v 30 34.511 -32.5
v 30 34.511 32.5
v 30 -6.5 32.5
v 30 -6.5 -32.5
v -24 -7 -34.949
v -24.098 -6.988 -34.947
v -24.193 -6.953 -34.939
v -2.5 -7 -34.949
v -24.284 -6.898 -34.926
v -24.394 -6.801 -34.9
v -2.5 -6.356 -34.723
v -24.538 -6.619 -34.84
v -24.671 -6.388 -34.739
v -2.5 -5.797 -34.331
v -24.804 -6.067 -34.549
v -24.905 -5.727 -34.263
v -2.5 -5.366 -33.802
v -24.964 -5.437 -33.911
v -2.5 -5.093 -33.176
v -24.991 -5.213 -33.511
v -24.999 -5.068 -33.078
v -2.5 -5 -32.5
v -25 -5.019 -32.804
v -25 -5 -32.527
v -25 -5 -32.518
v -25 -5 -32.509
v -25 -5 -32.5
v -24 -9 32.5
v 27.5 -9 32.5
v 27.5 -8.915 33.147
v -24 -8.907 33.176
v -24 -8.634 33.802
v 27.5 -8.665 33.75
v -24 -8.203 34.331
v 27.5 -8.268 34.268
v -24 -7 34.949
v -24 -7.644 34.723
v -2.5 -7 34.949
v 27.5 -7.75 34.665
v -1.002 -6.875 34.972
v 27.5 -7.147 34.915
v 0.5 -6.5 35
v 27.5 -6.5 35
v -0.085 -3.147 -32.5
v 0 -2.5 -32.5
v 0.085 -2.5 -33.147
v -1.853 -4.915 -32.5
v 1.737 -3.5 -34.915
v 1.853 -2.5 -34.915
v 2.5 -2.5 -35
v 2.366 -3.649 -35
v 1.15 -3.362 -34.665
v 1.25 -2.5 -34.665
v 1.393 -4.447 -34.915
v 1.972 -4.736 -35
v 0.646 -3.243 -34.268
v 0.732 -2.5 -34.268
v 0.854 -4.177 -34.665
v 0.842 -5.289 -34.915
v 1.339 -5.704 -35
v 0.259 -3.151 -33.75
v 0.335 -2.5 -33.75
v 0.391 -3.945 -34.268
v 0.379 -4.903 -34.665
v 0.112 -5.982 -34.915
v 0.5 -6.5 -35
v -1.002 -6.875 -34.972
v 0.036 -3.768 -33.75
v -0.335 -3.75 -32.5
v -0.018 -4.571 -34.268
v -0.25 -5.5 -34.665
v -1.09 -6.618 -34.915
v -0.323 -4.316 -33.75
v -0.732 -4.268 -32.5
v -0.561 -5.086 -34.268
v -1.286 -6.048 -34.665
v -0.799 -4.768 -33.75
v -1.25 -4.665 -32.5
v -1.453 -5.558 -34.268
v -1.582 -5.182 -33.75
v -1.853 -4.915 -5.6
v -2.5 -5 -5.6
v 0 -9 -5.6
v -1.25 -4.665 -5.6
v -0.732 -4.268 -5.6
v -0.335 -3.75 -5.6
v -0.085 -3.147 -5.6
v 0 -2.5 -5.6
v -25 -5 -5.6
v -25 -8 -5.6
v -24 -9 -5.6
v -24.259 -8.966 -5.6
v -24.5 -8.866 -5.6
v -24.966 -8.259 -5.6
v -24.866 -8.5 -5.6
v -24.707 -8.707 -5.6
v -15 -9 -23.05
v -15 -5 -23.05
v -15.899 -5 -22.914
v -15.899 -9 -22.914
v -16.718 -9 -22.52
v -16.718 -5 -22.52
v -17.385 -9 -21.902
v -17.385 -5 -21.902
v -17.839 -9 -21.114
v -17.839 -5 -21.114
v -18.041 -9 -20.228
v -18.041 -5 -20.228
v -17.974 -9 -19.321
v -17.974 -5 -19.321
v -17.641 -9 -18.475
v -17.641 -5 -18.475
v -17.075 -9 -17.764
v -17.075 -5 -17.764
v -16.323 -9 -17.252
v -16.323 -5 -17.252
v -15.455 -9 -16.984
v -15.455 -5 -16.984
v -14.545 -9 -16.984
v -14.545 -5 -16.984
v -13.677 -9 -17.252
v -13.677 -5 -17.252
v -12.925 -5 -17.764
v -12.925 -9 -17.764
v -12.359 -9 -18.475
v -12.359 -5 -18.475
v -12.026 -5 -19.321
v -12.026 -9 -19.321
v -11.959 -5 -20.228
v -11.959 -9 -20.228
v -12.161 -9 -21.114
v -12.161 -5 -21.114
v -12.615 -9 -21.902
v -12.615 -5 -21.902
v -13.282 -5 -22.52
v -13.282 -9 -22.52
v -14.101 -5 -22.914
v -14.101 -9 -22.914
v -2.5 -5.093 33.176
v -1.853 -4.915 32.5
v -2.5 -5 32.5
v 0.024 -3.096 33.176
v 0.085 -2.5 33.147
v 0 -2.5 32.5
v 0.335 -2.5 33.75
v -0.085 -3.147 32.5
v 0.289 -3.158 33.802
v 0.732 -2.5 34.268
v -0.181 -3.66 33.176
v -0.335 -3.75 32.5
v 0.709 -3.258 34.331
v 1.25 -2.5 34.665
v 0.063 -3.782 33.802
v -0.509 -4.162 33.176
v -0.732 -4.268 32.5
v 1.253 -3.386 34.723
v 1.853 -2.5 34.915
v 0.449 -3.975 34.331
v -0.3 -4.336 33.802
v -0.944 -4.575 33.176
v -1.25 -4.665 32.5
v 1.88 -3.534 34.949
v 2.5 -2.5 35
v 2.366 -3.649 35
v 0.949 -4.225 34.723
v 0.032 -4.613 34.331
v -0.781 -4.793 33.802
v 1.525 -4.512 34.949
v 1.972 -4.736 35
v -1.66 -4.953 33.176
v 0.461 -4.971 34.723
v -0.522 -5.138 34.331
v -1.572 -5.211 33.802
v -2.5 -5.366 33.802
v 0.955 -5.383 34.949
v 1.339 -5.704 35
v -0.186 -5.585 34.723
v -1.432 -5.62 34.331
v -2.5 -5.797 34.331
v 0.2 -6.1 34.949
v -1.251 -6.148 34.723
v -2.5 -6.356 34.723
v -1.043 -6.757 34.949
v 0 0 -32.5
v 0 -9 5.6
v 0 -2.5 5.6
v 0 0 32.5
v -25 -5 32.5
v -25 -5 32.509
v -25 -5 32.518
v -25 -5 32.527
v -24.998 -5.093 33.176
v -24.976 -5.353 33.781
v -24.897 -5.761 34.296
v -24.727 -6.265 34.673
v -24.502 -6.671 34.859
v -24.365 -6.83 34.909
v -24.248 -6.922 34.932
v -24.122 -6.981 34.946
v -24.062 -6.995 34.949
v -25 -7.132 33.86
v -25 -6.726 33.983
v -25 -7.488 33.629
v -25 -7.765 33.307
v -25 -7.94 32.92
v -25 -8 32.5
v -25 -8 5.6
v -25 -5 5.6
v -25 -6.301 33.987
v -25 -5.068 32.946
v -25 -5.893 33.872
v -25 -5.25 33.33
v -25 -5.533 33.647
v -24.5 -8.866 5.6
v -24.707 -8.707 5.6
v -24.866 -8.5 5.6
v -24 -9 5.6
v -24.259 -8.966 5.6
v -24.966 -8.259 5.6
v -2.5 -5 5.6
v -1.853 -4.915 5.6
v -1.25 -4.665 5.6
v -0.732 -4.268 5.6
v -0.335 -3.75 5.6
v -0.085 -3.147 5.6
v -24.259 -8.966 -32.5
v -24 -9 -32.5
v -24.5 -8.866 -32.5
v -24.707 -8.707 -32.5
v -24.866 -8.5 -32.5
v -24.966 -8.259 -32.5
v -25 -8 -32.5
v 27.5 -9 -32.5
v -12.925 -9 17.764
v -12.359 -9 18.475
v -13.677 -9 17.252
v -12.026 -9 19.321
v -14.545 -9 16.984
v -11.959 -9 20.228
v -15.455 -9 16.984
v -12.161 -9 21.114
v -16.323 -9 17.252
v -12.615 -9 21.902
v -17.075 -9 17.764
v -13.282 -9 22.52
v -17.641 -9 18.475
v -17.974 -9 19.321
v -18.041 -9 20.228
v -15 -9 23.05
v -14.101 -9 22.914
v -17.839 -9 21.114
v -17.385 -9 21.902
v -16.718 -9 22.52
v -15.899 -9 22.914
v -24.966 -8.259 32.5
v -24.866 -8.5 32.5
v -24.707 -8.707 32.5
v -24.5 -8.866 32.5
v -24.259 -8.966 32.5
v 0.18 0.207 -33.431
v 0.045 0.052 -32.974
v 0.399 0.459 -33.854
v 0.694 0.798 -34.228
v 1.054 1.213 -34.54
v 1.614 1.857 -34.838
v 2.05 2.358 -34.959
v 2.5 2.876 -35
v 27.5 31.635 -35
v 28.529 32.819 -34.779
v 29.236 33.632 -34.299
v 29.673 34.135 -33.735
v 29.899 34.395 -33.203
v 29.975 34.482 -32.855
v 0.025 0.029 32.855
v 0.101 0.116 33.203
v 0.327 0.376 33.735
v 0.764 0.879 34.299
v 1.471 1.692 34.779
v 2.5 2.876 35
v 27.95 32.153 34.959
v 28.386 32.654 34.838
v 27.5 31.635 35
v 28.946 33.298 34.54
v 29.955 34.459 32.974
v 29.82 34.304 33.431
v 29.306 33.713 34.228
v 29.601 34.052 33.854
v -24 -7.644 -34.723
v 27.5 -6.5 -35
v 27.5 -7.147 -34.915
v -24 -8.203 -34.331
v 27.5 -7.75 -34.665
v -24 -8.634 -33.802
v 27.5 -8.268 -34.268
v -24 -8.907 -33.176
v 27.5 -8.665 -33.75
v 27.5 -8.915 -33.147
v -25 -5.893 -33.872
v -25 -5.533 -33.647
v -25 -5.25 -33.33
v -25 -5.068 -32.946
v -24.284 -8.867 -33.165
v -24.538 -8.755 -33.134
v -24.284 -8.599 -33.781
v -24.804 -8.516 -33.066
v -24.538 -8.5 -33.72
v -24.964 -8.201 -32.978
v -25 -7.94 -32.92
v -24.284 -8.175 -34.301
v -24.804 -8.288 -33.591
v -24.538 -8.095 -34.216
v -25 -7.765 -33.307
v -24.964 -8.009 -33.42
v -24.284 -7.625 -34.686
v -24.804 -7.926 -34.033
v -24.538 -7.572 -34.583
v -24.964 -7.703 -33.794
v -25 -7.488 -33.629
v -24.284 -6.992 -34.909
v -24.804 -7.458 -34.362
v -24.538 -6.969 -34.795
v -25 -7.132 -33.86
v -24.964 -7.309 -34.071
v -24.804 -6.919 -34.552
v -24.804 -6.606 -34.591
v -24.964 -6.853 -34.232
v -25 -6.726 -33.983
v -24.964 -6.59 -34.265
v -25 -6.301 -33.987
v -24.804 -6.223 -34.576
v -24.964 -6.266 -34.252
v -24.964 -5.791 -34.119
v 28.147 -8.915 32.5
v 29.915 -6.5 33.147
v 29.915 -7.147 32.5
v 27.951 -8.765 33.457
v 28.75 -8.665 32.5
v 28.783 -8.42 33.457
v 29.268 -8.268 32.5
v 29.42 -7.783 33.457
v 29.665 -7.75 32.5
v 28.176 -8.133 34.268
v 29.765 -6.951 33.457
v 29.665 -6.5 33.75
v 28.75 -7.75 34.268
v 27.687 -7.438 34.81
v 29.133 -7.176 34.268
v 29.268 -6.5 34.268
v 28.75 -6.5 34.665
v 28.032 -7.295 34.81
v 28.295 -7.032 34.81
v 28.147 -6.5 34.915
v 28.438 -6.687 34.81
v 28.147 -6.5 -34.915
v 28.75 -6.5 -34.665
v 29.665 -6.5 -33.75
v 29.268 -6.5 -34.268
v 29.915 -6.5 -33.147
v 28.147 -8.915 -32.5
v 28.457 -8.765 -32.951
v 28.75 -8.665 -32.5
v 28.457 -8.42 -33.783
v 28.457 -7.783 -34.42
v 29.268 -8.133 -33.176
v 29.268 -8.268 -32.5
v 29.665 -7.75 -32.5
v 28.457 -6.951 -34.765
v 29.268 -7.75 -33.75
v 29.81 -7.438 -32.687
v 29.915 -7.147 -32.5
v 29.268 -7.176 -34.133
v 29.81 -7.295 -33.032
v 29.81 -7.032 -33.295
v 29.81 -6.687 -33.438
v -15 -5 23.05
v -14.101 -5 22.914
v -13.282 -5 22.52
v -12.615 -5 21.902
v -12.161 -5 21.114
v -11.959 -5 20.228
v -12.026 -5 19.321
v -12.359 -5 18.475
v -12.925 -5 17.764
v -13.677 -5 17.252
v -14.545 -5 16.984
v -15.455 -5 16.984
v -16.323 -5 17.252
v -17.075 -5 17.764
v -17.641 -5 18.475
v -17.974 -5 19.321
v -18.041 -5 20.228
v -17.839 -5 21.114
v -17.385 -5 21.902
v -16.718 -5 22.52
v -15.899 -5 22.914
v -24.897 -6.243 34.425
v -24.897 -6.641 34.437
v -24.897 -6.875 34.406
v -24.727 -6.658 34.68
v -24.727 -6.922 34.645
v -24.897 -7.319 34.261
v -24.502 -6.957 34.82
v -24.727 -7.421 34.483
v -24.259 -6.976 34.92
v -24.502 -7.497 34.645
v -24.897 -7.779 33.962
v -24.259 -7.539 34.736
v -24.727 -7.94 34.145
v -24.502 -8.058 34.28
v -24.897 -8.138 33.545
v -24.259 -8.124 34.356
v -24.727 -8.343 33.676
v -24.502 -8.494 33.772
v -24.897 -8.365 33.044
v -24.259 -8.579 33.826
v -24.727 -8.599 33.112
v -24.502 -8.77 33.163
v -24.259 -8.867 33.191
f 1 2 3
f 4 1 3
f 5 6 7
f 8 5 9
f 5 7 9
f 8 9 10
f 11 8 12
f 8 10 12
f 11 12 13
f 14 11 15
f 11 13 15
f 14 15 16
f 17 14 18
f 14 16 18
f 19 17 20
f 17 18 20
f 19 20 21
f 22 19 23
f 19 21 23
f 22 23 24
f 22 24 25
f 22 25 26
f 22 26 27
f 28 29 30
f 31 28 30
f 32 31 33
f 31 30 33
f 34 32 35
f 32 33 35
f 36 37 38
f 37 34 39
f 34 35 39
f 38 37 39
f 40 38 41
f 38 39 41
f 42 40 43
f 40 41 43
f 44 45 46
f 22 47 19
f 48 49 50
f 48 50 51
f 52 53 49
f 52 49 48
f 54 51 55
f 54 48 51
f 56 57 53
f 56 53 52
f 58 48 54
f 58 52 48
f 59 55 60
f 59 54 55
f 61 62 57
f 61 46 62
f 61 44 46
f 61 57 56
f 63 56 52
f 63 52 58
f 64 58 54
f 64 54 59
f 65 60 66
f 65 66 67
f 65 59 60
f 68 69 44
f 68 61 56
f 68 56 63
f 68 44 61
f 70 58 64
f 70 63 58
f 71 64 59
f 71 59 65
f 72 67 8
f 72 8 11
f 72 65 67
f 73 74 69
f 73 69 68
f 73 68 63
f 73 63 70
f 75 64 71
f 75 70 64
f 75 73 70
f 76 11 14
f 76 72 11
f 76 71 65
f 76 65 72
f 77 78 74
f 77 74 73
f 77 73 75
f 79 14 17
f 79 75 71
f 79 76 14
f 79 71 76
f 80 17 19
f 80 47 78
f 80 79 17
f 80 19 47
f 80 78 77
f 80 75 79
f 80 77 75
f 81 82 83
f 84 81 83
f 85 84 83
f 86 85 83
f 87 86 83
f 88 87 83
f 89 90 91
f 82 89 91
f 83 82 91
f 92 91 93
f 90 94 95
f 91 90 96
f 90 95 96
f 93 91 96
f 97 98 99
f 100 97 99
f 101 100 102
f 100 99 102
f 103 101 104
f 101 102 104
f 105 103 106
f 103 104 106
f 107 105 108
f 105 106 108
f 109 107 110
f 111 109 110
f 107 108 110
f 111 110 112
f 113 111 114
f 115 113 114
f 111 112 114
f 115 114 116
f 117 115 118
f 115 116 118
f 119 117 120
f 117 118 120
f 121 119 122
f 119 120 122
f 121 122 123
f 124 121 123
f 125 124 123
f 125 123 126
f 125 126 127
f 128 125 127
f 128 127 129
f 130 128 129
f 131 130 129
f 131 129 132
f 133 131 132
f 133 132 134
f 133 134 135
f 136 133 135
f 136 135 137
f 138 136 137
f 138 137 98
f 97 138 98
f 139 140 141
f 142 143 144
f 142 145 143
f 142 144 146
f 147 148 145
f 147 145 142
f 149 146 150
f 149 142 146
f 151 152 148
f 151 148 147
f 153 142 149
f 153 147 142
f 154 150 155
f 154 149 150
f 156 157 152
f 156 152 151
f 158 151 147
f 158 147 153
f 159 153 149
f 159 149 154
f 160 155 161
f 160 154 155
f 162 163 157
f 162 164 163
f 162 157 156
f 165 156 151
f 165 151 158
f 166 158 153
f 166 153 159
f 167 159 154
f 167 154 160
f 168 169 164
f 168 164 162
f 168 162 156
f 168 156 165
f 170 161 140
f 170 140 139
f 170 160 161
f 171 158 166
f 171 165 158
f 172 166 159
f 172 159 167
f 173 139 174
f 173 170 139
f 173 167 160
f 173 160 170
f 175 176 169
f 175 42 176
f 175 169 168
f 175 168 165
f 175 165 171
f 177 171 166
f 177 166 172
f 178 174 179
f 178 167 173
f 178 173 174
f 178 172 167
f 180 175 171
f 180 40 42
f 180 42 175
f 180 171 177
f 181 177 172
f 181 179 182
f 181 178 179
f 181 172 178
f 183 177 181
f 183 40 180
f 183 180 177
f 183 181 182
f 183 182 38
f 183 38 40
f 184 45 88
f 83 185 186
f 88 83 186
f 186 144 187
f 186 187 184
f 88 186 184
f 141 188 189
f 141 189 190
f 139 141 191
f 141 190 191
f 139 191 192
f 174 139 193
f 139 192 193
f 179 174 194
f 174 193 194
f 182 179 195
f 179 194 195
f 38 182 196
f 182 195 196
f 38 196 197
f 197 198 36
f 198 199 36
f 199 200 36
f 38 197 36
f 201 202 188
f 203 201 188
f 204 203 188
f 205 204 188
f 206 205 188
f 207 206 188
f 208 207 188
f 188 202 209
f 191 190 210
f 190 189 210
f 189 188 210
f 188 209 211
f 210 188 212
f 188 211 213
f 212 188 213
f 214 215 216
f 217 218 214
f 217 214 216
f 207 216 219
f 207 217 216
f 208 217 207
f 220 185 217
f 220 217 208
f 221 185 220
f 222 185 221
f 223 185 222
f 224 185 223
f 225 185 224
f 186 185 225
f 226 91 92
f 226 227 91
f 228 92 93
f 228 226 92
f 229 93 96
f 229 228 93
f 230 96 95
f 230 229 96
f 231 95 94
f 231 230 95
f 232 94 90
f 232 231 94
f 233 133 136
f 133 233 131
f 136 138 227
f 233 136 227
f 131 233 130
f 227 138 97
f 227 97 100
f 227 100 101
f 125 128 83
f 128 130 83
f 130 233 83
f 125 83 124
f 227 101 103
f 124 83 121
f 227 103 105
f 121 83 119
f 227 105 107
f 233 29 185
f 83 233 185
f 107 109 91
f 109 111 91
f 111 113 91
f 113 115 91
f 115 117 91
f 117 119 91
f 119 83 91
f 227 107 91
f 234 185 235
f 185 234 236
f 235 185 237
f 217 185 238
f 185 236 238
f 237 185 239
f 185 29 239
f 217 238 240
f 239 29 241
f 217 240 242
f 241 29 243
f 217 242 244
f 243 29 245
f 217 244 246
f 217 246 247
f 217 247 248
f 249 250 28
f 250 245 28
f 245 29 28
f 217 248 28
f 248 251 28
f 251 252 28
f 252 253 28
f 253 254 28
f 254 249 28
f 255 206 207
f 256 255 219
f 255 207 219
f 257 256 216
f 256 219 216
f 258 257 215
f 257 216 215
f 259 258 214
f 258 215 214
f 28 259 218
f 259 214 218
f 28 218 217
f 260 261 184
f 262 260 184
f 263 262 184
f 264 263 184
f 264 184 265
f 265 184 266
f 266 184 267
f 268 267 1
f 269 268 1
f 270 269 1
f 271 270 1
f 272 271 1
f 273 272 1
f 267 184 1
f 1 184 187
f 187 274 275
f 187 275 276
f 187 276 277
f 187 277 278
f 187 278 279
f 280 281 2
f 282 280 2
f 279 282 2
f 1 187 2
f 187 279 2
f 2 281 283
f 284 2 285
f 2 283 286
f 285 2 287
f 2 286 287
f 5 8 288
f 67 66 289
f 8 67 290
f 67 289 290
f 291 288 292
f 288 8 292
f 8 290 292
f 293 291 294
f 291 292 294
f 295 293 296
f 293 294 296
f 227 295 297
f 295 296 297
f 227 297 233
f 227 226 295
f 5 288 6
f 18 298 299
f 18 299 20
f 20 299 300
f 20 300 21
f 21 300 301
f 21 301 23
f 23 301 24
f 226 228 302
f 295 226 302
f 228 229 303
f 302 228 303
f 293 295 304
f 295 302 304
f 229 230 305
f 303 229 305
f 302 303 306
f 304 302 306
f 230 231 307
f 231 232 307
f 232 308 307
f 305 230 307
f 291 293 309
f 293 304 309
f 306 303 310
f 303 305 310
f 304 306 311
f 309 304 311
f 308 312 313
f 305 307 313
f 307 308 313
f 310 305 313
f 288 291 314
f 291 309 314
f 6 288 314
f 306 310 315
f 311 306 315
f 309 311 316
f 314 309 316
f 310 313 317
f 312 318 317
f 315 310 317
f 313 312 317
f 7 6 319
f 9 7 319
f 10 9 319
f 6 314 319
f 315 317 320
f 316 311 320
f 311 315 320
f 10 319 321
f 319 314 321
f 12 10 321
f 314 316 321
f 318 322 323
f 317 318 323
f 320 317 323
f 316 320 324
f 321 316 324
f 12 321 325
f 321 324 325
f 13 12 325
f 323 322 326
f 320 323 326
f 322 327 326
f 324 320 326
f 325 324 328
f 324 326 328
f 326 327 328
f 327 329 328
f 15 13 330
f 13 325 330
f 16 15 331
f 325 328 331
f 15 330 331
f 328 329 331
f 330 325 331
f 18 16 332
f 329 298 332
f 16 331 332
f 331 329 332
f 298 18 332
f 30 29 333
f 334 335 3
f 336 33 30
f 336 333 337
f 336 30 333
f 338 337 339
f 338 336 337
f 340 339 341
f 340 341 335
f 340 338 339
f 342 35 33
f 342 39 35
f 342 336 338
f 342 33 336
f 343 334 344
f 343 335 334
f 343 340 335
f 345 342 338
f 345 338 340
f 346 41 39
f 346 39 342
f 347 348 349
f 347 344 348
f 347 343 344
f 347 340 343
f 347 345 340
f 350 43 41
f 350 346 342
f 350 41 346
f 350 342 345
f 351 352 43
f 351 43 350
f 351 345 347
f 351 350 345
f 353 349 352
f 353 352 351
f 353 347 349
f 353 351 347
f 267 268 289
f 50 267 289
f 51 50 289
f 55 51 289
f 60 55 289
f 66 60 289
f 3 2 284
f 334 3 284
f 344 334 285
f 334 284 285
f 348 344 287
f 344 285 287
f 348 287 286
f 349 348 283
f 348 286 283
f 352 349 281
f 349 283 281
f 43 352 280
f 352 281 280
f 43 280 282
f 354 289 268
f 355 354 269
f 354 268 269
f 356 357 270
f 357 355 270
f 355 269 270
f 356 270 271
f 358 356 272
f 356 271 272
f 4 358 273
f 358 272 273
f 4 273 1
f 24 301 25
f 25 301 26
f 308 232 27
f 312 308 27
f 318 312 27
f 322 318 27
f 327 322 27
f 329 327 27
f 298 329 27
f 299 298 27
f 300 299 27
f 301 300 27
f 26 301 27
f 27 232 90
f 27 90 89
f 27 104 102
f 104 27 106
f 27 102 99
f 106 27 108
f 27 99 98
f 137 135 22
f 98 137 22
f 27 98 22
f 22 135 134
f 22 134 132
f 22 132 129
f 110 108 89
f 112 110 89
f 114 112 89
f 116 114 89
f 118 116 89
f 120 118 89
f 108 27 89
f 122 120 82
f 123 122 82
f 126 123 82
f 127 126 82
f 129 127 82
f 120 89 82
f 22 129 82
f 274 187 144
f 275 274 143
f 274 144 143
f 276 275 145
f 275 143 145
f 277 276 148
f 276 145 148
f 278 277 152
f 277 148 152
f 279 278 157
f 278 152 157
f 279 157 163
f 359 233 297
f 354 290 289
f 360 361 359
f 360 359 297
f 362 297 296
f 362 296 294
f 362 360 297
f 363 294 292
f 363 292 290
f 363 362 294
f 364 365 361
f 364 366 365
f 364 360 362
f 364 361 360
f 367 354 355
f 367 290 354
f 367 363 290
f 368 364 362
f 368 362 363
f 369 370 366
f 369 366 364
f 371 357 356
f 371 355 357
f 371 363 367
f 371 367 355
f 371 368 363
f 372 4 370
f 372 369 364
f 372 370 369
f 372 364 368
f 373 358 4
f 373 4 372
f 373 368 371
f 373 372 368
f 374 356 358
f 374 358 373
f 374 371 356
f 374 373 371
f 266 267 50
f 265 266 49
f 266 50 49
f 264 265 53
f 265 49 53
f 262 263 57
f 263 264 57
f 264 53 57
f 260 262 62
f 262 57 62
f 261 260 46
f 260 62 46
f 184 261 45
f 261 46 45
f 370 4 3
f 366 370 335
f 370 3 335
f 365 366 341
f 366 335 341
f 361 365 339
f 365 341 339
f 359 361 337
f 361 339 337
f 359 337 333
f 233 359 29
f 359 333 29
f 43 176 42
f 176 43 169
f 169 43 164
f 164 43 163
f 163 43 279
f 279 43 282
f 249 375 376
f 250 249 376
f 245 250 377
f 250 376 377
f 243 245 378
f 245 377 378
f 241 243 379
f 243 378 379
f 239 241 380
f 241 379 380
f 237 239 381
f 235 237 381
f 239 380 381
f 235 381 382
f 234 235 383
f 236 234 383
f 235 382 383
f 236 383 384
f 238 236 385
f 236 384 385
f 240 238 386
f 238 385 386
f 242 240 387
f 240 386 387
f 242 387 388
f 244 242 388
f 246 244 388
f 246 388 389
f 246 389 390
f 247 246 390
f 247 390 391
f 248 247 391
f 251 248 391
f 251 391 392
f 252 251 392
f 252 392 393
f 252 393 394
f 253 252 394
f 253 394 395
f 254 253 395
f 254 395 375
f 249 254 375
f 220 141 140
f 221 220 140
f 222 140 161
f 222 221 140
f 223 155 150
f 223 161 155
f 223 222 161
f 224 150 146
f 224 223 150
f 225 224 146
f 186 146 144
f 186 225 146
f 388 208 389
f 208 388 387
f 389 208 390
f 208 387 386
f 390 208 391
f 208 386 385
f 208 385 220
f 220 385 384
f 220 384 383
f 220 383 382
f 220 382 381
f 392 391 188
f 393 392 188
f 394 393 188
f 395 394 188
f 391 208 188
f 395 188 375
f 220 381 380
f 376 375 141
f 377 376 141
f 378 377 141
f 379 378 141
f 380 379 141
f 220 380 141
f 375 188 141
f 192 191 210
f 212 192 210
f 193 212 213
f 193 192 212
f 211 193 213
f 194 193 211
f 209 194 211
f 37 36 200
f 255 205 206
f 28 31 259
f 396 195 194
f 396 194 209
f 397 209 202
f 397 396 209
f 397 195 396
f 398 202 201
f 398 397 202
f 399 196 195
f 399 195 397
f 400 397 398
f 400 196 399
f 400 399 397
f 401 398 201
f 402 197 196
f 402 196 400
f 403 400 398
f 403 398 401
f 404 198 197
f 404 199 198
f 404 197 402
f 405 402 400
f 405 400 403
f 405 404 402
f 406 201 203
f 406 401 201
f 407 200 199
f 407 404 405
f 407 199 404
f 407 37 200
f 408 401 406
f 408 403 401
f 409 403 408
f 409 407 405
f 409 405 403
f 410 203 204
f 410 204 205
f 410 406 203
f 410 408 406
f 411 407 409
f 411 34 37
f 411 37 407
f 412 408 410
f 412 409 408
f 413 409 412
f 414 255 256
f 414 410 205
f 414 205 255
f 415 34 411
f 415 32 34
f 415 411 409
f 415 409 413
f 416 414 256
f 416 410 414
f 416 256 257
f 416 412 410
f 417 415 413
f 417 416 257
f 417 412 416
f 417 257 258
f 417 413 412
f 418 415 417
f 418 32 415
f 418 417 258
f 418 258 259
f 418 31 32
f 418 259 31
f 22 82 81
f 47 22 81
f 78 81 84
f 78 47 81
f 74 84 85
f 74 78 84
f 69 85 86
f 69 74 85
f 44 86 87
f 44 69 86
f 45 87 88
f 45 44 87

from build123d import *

# Parameters (mm, degrees)
BOSS_EXTRUDE1_DEPTH = 35
SKETCH3_W           = 11.2
SKETCH3_H           = 6
CUT_EXTRUDE1_DEPTH  = 58.584830686
SKETCH4_R           = 3.05
CUT_EXTRUDE2_DEPTH  = 61.713451947
FILLET1_R           = 2.5
FILLET4_R           = 1


# Some blends are built 0.0001 mm under size
with BuildPart() as part:
    # Sketch2 → Boss-Extrude1 (new, symmetric)
    with BuildSketch(Plane.XY):
        Polygon((0, 0), (30, 34.511052217), (30, -9), (-25, -9), (-25, -5), (0, -5), align=None)
    extrude(amount=BOSS_EXTRUDE1_DEPTH, both=True)

    # Sketch3 → Cut-Extrude1 (cut, through all)
    with BuildSketch(Plane(origin=(0, 0, 0), x_dir=(0, 0, -1), z_dir=(1, 0, 0))):
        with Locations((0, -6)):
            Rectangle(SKETCH3_W, SKETCH3_H)
    extrude(amount=-CUT_EXTRUDE1_DEPTH, mode=Mode.SUBTRACT)

    # Sketch4 → Cut-Extrude2 (cut, through all)
    with BuildSketch(Plane(origin=(0, -5, 0), x_dir=(1, 0, 0), z_dir=(0, 1, 0))):
        with Locations(Location((-15, -20, 0), (0, 0, 270))):
            Circle(SKETCH4_R)
        with Locations(Location((-15, 20, 0), (0, 0, 90))):
            Circle(SKETCH4_R)
    extrude(amount=-CUT_EXTRUDE2_DEPTH, mode=Mode.SUBTRACT)

    # Fillet1
    # the kernel refuses this fillet: 2.5 mm, written as the material it adds along each edge
    with BuildSketch(Plane(origin=(0, -5, -35), x_dir=(0, 1, 0), z_dir=(0, 0, 1)), Plane(origin=(0, -5, 5.6), x_dir=(0, 1, 0), z_dir=(0, 0, 1))) as fillet1_piece_1:
        with BuildLine():
            CenterArc((FILLET1_R, FILLET1_R), FILLET1_R, 180, 90)
            Line((0, FILLET1_R), (0, 0))
            Line((0, 0), (FILLET1_R, 0))
        make_face()
    extrude(amount=29.4)
    # the kernel refuses this fillet: 2.5 mm, written as the material it takes off along each edge
    with BuildSketch(Plane(origin=(27.5, -6.5, 32.5), x_dir=(1, 0, 0), z_dir=(0, 0, 1))) as fillet1_2_piece_1_section:
        Polygon((0, 0), (FILLET1_R, 0), (FILLET1_R, -FILLET1_R), (0, -FILLET1_R), align=None)
    fillet1_2_piece_1 = extrude(amount=FILLET1_R, mode=Mode.PRIVATE)
    fillet1_2_piece_1 = fillet1_2_piece_1 - Plane(origin=(27.5, -6.5, 32.5), x_dir=(-0.7071067811865476, 0.7071067811865474, 0), z_dir=(0, 0, 1)) * Sphere(FILLET1_R, mode=Mode.PRIVATE)
    add(fillet1_2_piece_1, mode=Mode.SUBTRACT)
    with BuildSketch(Plane(origin=(27.5, -6.5, -32.5), x_dir=(0, 0, -1), z_dir=(1, 0, 0))) as fillet1_2_piece_2_section:
        Polygon((0, 0), (FILLET1_R, 0), (FILLET1_R, -FILLET1_R), (0, -FILLET1_R), align=None)
    fillet1_2_piece_2 = extrude(amount=FILLET1_R, mode=Mode.PRIVATE)
    fillet1_2_piece_2 = fillet1_2_piece_2 - Plane(origin=(27.5, -6.5, -32.5), x_dir=(0, 0.7071067811865475, 0.7071067811865475), z_dir=(1, 0, 0)) * Sphere(FILLET1_R, mode=Mode.PRIVATE)
    add(fillet1_2_piece_2, mode=Mode.SUBTRACT)
    with BuildSketch(Plane(origin=(30, -9, 32.5), x_dir=(-1, 0, 0), z_dir=(0, 0, -1))) as fillet1_2_piece_3:
        with BuildLine():
            CenterArc((FILLET1_R, FILLET1_R), FILLET1_R, 180, 90)
            Line((0, FILLET1_R), (0, 0))
            Line((0, 0), (FILLET1_R, 0))
        make_face()
    extrude(amount=65, mode=Mode.SUBTRACT)
    with BuildSketch(Plane(origin=(30, 40.761052217, -35), x_dir=(0, 0, 1), z_dir=(0, -1, 0)), Plane(origin=(30, 40.761052217, 35), x_dir=(-1, 0, 0), z_dir=(0, -1, 0))) as fillet1_2_piece_4:
        with BuildLine():
            CenterArc((FILLET1_R, FILLET1_R), FILLET1_R, 180, 90)
            Line((0, FILLET1_R), (0, 0))
            Line((0, 0), (FILLET1_R, 0))
        make_face()
    extrude(amount=47.261052217, mode=Mode.SUBTRACT)
    with BuildSketch(Plane(origin=(27.5, -9, 35), x_dir=(0, 1, 0), z_dir=(-1, 0, 0)), Plane(origin=(27.5, -9, -35), x_dir=(0, 0, 1), z_dir=(-1, 0, 0))) as fillet1_2_piece_5:
        with BuildLine():
            CenterArc((FILLET1_R, FILLET1_R), FILLET1_R, 180, 90)
            Line((0, FILLET1_R), (0, 0))
            Line((0, 0), (FILLET1_R, 0))
        make_face()
    extrude(amount=58.75, mode=Mode.SUBTRACT)
    # the kernel refuses this fillet: 2.5 mm, written as the material it takes off along each edge
    with BuildSketch(Plane(origin=(0, -2.5, 35), x_dir=(0, 0, -1), z_dir=(0, 1, 0))) as fillet1_3_piece_1:
        with BuildLine():
            CenterArc((FILLET1_R, -FILLET1_R), FILLET1_R, 90, 90)
            Line((0, -FILLET1_R), (0, 0))
            Line((0, 0), (FILLET1_R, 0))
        make_face()
    extrude(amount=8.75, mode=Mode.SUBTRACT)
    with BuildSketch(Plane(origin=(0, -2.5, -35), x_dir=(0, 0, 1), z_dir=(0, 1, 0))) as fillet1_3_piece_2:
        with BuildLine():
            CenterArc((FILLET1_R, FILLET1_R), FILLET1_R, 180, 90)
            Line((0, FILLET1_R), (0, 0))
            Line((0, 0), (FILLET1_R, 0))
        make_face()
    extrude(amount=8.75, mode=Mode.SUBTRACT)
    with BuildSketch(Plane(origin=(-31.25, -5, 35), x_dir=(0, -1, 0), z_dir=(1, 0, 0))) as fillet1_3_piece_3:
        with BuildLine():
            CenterArc((FILLET1_R, FILLET1_R), FILLET1_R, 180, 90)
            Line((0, FILLET1_R), (0, 0))
            Line((0, 0), (FILLET1_R, 0))
        make_face()
    extrude(amount=28.75, mode=Mode.SUBTRACT)
    with BuildSketch(Plane(origin=(-31.25, -5, -35), x_dir=(0, -1, 0), z_dir=(1, 0, 0))) as fillet1_3_piece_4:
        with BuildLine():
            CenterArc((FILLET1_R, -FILLET1_R), FILLET1_R, 90, 90)
            Line((0, -FILLET1_R), (0, 0))
            Line((0, 0), (FILLET1_R, 0))
        make_face()
    extrude(amount=28.75, mode=Mode.SUBTRACT)
    with BuildSketch(Plane(origin=(-2.5, -2.5, -35), x_dir=(1, 0, 0), z_dir=(0, 1, 0))) as fillet1_3_piece_5:
        with BuildLine():
            CenterArc((2.5 + FILLET1_R, -FILLET1_R), FILLET1_R, 90, 90)
            Line((2.5, -FILLET1_R), (2.5, 0))
            Line((2.5, 0), (2.5 + FILLET1_R, 0))
        make_face()
    revolve(axis=Axis((-2.5, -2.5, -35), (0, 0, -1)), revolution_arc=90, mode=Mode.SUBTRACT)
    with BuildSketch(Plane(origin=(-2.5, -2.5, 35), x_dir=(1, 0, 0), z_dir=(0, 1, 0))) as fillet1_3_piece_6:
        with BuildLine():
            CenterArc((2.5 + FILLET1_R, FILLET1_R), FILLET1_R, 180, 90)
            Line((2.5, FILLET1_R), (2.5, 0))
            Line((2.5, 0), (2.5 + FILLET1_R, 0))
        make_face()
    revolve(axis=Axis((-2.5, -2.5, 35), (0, 0, -1)), revolution_arc=90, mode=Mode.SUBTRACT)

    # Fillet4
    fillet4_edges = [part.edges().sort_by_distance(p)[0] for p in [
        (-25, -8.436491673, -34.08113883),
        (-25, -8.436491673, 34.08113883),
        (-25, -9, -19.05),
        (-25, -9, 19.05),
    ]]
    fillet(fillet4_edges, radius=FILLET4_R - 0.0001)  # a hair under: the kernel refuses the full size


solid = part.part
